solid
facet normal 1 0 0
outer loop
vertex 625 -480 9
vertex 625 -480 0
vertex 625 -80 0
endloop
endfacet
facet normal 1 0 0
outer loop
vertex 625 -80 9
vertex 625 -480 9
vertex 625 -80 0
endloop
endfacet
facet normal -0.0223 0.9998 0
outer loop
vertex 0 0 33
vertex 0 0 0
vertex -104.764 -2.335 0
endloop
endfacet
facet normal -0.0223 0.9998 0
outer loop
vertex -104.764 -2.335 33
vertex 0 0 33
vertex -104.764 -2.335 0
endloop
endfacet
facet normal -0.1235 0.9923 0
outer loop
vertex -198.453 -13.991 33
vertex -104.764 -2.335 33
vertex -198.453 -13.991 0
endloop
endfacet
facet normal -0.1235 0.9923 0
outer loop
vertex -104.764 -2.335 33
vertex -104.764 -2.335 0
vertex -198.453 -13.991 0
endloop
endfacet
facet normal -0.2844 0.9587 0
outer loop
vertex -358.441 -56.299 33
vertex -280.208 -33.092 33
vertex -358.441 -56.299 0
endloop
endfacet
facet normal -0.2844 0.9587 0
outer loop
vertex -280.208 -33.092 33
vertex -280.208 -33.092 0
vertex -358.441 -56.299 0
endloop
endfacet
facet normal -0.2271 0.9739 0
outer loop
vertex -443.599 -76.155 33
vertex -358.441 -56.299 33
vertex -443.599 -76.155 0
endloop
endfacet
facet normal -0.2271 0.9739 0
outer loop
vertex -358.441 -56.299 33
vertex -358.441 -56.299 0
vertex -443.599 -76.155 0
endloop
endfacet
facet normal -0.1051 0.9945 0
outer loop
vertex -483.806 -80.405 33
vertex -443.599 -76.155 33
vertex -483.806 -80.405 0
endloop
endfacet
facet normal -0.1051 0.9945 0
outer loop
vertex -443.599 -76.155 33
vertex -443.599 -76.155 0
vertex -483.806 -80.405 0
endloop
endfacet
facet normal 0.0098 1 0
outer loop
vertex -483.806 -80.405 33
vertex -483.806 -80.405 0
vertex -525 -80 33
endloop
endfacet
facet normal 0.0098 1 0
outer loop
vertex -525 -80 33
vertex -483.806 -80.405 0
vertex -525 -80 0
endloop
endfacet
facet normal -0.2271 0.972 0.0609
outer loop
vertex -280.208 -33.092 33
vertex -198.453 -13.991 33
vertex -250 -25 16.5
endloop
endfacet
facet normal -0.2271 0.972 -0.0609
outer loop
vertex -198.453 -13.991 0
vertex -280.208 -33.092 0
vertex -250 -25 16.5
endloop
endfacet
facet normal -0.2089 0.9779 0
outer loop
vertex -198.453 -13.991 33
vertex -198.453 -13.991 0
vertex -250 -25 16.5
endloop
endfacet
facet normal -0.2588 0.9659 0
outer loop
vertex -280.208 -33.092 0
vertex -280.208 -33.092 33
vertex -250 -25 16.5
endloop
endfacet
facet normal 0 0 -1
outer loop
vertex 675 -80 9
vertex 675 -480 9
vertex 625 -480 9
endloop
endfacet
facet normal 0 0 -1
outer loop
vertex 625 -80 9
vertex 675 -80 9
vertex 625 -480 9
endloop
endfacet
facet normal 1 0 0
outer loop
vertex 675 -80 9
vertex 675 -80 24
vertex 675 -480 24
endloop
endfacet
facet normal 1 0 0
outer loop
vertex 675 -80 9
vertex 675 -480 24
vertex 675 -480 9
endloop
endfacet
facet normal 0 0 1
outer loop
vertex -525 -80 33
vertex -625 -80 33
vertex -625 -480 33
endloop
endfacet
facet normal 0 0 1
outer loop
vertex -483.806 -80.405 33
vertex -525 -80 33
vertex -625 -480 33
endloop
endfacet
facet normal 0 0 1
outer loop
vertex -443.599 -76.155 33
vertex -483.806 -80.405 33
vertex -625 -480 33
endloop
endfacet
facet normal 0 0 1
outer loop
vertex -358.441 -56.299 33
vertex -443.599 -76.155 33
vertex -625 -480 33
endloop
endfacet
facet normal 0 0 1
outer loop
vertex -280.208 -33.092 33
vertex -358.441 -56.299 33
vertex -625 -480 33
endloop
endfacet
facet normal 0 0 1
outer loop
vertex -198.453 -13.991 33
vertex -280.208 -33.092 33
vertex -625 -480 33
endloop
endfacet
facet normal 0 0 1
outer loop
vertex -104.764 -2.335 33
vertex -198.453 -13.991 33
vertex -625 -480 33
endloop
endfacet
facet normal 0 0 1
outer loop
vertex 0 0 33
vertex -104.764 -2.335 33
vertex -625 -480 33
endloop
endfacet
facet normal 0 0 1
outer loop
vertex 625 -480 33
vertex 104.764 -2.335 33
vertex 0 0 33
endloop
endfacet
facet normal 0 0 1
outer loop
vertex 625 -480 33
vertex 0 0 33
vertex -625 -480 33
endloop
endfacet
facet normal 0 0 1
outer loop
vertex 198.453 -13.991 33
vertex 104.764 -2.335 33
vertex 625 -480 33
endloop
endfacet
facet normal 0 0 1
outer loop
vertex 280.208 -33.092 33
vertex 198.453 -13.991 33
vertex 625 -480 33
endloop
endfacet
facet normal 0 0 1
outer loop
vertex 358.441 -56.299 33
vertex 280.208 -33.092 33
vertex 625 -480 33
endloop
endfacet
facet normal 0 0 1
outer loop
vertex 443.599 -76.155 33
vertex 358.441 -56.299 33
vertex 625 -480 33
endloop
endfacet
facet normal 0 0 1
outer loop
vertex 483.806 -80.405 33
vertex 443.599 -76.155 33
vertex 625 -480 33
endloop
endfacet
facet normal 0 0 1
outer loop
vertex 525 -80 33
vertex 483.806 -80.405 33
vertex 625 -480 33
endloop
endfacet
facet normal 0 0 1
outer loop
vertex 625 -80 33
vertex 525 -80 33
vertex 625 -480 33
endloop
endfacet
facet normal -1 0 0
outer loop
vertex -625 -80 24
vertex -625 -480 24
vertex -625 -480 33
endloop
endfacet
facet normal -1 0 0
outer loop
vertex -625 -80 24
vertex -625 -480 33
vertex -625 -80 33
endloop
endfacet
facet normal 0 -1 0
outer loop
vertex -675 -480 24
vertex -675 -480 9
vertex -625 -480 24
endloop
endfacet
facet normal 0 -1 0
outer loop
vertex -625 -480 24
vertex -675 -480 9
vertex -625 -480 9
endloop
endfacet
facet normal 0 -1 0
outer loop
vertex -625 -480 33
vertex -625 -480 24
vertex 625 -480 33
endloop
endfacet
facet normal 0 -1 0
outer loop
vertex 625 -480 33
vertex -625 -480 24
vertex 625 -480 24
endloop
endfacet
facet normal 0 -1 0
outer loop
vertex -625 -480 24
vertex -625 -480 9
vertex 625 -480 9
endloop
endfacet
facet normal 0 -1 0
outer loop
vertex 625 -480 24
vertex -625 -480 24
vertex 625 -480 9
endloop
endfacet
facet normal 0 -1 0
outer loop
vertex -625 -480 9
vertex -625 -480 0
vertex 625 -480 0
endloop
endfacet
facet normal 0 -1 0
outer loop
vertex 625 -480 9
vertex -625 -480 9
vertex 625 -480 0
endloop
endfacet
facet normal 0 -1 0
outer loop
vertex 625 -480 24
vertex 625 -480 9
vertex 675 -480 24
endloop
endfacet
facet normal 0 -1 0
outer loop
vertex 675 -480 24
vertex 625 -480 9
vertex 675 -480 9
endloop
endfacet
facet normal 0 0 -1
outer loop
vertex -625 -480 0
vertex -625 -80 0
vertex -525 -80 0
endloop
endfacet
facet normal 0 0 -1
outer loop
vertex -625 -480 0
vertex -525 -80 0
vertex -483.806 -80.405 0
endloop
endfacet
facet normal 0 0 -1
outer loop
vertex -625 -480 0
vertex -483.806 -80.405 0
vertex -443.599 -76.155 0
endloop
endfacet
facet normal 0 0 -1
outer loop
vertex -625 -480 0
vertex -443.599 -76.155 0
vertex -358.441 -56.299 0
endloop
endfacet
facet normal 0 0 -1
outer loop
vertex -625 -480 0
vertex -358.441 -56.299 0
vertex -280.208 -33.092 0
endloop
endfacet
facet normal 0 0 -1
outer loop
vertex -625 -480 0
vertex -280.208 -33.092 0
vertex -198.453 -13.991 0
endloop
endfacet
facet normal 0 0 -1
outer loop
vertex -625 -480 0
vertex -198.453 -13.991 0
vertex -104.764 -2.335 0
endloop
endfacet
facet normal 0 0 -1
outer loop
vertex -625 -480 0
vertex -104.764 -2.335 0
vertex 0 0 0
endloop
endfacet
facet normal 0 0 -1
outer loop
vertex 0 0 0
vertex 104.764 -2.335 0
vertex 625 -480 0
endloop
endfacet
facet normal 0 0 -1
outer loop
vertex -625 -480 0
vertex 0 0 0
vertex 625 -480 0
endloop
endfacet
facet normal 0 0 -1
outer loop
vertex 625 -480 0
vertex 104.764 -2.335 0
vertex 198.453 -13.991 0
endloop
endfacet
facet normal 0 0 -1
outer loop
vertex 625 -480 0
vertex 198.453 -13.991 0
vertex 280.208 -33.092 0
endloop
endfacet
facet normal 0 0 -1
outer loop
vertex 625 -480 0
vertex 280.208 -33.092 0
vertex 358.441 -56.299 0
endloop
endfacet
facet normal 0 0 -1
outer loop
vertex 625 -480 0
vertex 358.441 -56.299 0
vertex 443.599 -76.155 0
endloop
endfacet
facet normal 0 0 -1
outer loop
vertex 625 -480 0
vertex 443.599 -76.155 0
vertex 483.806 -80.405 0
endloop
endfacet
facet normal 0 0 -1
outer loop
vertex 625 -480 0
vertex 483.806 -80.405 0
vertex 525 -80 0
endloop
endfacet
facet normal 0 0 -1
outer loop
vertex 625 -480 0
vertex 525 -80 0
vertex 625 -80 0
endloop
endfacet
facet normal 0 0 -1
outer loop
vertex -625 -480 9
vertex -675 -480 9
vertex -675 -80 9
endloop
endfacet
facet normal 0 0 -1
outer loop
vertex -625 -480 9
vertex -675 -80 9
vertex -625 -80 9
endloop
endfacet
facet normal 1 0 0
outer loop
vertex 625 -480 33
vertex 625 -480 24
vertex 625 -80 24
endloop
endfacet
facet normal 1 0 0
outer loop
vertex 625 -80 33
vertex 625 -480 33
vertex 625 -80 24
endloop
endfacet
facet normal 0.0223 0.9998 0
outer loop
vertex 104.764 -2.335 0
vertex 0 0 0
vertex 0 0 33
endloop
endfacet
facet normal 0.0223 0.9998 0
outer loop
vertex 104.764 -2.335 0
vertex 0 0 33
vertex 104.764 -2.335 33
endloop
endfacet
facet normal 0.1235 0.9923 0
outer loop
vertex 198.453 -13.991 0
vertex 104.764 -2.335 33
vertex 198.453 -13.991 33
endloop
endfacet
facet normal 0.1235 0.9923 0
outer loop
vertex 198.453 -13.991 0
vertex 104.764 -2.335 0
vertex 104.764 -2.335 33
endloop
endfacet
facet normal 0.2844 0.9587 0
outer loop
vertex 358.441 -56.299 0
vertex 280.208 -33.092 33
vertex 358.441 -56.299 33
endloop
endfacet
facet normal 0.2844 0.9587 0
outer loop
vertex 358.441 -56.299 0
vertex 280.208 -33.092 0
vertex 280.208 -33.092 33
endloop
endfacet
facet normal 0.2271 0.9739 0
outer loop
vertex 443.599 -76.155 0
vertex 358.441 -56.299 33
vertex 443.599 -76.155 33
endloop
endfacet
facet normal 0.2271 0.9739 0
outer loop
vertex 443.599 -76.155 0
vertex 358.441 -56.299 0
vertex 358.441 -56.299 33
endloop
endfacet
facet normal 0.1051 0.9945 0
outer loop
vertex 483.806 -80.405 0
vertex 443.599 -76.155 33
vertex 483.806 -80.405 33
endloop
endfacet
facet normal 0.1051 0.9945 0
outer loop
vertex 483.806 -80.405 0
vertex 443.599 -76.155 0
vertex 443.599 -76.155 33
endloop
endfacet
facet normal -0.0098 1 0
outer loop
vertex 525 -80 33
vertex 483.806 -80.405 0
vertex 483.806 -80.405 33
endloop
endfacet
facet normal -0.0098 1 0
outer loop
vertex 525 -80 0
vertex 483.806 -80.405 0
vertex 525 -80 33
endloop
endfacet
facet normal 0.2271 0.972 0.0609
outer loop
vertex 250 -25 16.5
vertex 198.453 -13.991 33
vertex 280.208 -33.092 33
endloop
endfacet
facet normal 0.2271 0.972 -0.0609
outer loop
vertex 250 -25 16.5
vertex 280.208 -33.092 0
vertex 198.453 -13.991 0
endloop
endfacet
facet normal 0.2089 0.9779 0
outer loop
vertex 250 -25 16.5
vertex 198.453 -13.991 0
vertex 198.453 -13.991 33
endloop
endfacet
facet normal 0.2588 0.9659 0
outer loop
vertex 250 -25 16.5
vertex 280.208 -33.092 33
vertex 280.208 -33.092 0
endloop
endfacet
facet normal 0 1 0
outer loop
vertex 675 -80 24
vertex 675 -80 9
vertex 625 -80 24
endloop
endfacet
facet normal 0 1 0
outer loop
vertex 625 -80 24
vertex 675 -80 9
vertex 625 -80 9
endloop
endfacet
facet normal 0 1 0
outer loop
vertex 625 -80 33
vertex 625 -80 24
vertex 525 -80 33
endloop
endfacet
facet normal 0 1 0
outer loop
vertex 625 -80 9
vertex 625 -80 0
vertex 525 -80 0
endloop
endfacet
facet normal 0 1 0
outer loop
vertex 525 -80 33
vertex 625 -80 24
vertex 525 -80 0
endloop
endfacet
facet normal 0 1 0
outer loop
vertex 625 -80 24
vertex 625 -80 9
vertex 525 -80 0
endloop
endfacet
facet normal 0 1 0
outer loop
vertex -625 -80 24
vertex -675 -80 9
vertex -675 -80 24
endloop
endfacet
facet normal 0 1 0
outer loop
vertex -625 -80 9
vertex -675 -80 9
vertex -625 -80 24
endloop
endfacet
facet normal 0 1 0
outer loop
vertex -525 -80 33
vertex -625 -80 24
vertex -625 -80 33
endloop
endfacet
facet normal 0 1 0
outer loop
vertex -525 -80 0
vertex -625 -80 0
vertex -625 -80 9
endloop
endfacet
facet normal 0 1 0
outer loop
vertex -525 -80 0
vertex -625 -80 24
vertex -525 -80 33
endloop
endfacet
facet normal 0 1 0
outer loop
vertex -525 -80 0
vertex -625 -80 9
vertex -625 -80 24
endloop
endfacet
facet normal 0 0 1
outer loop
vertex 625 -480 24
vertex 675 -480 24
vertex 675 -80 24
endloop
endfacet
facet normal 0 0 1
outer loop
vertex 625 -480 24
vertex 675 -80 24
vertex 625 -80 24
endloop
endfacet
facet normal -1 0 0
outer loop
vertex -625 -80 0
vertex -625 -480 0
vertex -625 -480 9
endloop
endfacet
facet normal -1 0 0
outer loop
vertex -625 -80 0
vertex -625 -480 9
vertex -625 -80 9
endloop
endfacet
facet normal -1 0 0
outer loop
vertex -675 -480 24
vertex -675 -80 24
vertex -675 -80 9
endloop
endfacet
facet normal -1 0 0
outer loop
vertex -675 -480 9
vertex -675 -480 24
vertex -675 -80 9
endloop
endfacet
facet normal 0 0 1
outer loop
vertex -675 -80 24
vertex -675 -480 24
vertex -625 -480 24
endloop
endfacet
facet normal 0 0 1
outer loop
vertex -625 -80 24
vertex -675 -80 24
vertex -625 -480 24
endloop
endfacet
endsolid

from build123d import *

# Parameters (mm, degrees)
BOSS_EXTRUDE1_DEPTH = 33
SKETCH2_W           = 50
SKETCH2_H           = 15
BOSS_EXTRUDE2_DEPTH = 400


with BuildPart() as part:
    # Sketch1 → Boss-Extrude1 (new body)
    with BuildSketch(Plane.XY):
        with BuildLine():
            Line((0, 0), (0, -480))
            Line((0, -480), (-625, -480))
            Line((-625, -480), (-625, -80))
            Line((-625, -80), (-525, -80))
            add(Edge.make_bspline(
                [(0, 0), (-83.701492577, 2.102656983), (-263.298331294, -12.316995698), (-428.0447482, -87.215369033), (-525, -80)],
                knots=[0, 0, 0, 0, 0.472195636, 1, 1, 1, 1], degree=3))
        make_face()
    boss_extrude1 = extrude(amount=BOSS_EXTRUDE1_DEPTH)

    # Sketch2 → Boss-Extrude2 (add, through all)
    with BuildSketch(Plane(origin=(0, -80, 0), x_dir=(1, 0, 0), z_dir=(0, 1, 0))):
        with Locations((-650, -16.5)):
            Rectangle(SKETCH2_W, SKETCH2_H)
    boss_extrude2 = extrude(amount=-BOSS_EXTRUDE2_DEPTH)

    # Mirror2: Boss-Extrude1, Boss-Extrude2 across plane
    add(boss_extrude1.mirror(Plane(origin=(0, 0, 0), x_dir=(0, 0, 1), z_dir=(1, 0, 0))))
    add(boss_extrude2.mirror(Plane(origin=(0, 0, 0), x_dir=(0, 0, 1), z_dir=(1, 0, 0))))


solid = part.part
